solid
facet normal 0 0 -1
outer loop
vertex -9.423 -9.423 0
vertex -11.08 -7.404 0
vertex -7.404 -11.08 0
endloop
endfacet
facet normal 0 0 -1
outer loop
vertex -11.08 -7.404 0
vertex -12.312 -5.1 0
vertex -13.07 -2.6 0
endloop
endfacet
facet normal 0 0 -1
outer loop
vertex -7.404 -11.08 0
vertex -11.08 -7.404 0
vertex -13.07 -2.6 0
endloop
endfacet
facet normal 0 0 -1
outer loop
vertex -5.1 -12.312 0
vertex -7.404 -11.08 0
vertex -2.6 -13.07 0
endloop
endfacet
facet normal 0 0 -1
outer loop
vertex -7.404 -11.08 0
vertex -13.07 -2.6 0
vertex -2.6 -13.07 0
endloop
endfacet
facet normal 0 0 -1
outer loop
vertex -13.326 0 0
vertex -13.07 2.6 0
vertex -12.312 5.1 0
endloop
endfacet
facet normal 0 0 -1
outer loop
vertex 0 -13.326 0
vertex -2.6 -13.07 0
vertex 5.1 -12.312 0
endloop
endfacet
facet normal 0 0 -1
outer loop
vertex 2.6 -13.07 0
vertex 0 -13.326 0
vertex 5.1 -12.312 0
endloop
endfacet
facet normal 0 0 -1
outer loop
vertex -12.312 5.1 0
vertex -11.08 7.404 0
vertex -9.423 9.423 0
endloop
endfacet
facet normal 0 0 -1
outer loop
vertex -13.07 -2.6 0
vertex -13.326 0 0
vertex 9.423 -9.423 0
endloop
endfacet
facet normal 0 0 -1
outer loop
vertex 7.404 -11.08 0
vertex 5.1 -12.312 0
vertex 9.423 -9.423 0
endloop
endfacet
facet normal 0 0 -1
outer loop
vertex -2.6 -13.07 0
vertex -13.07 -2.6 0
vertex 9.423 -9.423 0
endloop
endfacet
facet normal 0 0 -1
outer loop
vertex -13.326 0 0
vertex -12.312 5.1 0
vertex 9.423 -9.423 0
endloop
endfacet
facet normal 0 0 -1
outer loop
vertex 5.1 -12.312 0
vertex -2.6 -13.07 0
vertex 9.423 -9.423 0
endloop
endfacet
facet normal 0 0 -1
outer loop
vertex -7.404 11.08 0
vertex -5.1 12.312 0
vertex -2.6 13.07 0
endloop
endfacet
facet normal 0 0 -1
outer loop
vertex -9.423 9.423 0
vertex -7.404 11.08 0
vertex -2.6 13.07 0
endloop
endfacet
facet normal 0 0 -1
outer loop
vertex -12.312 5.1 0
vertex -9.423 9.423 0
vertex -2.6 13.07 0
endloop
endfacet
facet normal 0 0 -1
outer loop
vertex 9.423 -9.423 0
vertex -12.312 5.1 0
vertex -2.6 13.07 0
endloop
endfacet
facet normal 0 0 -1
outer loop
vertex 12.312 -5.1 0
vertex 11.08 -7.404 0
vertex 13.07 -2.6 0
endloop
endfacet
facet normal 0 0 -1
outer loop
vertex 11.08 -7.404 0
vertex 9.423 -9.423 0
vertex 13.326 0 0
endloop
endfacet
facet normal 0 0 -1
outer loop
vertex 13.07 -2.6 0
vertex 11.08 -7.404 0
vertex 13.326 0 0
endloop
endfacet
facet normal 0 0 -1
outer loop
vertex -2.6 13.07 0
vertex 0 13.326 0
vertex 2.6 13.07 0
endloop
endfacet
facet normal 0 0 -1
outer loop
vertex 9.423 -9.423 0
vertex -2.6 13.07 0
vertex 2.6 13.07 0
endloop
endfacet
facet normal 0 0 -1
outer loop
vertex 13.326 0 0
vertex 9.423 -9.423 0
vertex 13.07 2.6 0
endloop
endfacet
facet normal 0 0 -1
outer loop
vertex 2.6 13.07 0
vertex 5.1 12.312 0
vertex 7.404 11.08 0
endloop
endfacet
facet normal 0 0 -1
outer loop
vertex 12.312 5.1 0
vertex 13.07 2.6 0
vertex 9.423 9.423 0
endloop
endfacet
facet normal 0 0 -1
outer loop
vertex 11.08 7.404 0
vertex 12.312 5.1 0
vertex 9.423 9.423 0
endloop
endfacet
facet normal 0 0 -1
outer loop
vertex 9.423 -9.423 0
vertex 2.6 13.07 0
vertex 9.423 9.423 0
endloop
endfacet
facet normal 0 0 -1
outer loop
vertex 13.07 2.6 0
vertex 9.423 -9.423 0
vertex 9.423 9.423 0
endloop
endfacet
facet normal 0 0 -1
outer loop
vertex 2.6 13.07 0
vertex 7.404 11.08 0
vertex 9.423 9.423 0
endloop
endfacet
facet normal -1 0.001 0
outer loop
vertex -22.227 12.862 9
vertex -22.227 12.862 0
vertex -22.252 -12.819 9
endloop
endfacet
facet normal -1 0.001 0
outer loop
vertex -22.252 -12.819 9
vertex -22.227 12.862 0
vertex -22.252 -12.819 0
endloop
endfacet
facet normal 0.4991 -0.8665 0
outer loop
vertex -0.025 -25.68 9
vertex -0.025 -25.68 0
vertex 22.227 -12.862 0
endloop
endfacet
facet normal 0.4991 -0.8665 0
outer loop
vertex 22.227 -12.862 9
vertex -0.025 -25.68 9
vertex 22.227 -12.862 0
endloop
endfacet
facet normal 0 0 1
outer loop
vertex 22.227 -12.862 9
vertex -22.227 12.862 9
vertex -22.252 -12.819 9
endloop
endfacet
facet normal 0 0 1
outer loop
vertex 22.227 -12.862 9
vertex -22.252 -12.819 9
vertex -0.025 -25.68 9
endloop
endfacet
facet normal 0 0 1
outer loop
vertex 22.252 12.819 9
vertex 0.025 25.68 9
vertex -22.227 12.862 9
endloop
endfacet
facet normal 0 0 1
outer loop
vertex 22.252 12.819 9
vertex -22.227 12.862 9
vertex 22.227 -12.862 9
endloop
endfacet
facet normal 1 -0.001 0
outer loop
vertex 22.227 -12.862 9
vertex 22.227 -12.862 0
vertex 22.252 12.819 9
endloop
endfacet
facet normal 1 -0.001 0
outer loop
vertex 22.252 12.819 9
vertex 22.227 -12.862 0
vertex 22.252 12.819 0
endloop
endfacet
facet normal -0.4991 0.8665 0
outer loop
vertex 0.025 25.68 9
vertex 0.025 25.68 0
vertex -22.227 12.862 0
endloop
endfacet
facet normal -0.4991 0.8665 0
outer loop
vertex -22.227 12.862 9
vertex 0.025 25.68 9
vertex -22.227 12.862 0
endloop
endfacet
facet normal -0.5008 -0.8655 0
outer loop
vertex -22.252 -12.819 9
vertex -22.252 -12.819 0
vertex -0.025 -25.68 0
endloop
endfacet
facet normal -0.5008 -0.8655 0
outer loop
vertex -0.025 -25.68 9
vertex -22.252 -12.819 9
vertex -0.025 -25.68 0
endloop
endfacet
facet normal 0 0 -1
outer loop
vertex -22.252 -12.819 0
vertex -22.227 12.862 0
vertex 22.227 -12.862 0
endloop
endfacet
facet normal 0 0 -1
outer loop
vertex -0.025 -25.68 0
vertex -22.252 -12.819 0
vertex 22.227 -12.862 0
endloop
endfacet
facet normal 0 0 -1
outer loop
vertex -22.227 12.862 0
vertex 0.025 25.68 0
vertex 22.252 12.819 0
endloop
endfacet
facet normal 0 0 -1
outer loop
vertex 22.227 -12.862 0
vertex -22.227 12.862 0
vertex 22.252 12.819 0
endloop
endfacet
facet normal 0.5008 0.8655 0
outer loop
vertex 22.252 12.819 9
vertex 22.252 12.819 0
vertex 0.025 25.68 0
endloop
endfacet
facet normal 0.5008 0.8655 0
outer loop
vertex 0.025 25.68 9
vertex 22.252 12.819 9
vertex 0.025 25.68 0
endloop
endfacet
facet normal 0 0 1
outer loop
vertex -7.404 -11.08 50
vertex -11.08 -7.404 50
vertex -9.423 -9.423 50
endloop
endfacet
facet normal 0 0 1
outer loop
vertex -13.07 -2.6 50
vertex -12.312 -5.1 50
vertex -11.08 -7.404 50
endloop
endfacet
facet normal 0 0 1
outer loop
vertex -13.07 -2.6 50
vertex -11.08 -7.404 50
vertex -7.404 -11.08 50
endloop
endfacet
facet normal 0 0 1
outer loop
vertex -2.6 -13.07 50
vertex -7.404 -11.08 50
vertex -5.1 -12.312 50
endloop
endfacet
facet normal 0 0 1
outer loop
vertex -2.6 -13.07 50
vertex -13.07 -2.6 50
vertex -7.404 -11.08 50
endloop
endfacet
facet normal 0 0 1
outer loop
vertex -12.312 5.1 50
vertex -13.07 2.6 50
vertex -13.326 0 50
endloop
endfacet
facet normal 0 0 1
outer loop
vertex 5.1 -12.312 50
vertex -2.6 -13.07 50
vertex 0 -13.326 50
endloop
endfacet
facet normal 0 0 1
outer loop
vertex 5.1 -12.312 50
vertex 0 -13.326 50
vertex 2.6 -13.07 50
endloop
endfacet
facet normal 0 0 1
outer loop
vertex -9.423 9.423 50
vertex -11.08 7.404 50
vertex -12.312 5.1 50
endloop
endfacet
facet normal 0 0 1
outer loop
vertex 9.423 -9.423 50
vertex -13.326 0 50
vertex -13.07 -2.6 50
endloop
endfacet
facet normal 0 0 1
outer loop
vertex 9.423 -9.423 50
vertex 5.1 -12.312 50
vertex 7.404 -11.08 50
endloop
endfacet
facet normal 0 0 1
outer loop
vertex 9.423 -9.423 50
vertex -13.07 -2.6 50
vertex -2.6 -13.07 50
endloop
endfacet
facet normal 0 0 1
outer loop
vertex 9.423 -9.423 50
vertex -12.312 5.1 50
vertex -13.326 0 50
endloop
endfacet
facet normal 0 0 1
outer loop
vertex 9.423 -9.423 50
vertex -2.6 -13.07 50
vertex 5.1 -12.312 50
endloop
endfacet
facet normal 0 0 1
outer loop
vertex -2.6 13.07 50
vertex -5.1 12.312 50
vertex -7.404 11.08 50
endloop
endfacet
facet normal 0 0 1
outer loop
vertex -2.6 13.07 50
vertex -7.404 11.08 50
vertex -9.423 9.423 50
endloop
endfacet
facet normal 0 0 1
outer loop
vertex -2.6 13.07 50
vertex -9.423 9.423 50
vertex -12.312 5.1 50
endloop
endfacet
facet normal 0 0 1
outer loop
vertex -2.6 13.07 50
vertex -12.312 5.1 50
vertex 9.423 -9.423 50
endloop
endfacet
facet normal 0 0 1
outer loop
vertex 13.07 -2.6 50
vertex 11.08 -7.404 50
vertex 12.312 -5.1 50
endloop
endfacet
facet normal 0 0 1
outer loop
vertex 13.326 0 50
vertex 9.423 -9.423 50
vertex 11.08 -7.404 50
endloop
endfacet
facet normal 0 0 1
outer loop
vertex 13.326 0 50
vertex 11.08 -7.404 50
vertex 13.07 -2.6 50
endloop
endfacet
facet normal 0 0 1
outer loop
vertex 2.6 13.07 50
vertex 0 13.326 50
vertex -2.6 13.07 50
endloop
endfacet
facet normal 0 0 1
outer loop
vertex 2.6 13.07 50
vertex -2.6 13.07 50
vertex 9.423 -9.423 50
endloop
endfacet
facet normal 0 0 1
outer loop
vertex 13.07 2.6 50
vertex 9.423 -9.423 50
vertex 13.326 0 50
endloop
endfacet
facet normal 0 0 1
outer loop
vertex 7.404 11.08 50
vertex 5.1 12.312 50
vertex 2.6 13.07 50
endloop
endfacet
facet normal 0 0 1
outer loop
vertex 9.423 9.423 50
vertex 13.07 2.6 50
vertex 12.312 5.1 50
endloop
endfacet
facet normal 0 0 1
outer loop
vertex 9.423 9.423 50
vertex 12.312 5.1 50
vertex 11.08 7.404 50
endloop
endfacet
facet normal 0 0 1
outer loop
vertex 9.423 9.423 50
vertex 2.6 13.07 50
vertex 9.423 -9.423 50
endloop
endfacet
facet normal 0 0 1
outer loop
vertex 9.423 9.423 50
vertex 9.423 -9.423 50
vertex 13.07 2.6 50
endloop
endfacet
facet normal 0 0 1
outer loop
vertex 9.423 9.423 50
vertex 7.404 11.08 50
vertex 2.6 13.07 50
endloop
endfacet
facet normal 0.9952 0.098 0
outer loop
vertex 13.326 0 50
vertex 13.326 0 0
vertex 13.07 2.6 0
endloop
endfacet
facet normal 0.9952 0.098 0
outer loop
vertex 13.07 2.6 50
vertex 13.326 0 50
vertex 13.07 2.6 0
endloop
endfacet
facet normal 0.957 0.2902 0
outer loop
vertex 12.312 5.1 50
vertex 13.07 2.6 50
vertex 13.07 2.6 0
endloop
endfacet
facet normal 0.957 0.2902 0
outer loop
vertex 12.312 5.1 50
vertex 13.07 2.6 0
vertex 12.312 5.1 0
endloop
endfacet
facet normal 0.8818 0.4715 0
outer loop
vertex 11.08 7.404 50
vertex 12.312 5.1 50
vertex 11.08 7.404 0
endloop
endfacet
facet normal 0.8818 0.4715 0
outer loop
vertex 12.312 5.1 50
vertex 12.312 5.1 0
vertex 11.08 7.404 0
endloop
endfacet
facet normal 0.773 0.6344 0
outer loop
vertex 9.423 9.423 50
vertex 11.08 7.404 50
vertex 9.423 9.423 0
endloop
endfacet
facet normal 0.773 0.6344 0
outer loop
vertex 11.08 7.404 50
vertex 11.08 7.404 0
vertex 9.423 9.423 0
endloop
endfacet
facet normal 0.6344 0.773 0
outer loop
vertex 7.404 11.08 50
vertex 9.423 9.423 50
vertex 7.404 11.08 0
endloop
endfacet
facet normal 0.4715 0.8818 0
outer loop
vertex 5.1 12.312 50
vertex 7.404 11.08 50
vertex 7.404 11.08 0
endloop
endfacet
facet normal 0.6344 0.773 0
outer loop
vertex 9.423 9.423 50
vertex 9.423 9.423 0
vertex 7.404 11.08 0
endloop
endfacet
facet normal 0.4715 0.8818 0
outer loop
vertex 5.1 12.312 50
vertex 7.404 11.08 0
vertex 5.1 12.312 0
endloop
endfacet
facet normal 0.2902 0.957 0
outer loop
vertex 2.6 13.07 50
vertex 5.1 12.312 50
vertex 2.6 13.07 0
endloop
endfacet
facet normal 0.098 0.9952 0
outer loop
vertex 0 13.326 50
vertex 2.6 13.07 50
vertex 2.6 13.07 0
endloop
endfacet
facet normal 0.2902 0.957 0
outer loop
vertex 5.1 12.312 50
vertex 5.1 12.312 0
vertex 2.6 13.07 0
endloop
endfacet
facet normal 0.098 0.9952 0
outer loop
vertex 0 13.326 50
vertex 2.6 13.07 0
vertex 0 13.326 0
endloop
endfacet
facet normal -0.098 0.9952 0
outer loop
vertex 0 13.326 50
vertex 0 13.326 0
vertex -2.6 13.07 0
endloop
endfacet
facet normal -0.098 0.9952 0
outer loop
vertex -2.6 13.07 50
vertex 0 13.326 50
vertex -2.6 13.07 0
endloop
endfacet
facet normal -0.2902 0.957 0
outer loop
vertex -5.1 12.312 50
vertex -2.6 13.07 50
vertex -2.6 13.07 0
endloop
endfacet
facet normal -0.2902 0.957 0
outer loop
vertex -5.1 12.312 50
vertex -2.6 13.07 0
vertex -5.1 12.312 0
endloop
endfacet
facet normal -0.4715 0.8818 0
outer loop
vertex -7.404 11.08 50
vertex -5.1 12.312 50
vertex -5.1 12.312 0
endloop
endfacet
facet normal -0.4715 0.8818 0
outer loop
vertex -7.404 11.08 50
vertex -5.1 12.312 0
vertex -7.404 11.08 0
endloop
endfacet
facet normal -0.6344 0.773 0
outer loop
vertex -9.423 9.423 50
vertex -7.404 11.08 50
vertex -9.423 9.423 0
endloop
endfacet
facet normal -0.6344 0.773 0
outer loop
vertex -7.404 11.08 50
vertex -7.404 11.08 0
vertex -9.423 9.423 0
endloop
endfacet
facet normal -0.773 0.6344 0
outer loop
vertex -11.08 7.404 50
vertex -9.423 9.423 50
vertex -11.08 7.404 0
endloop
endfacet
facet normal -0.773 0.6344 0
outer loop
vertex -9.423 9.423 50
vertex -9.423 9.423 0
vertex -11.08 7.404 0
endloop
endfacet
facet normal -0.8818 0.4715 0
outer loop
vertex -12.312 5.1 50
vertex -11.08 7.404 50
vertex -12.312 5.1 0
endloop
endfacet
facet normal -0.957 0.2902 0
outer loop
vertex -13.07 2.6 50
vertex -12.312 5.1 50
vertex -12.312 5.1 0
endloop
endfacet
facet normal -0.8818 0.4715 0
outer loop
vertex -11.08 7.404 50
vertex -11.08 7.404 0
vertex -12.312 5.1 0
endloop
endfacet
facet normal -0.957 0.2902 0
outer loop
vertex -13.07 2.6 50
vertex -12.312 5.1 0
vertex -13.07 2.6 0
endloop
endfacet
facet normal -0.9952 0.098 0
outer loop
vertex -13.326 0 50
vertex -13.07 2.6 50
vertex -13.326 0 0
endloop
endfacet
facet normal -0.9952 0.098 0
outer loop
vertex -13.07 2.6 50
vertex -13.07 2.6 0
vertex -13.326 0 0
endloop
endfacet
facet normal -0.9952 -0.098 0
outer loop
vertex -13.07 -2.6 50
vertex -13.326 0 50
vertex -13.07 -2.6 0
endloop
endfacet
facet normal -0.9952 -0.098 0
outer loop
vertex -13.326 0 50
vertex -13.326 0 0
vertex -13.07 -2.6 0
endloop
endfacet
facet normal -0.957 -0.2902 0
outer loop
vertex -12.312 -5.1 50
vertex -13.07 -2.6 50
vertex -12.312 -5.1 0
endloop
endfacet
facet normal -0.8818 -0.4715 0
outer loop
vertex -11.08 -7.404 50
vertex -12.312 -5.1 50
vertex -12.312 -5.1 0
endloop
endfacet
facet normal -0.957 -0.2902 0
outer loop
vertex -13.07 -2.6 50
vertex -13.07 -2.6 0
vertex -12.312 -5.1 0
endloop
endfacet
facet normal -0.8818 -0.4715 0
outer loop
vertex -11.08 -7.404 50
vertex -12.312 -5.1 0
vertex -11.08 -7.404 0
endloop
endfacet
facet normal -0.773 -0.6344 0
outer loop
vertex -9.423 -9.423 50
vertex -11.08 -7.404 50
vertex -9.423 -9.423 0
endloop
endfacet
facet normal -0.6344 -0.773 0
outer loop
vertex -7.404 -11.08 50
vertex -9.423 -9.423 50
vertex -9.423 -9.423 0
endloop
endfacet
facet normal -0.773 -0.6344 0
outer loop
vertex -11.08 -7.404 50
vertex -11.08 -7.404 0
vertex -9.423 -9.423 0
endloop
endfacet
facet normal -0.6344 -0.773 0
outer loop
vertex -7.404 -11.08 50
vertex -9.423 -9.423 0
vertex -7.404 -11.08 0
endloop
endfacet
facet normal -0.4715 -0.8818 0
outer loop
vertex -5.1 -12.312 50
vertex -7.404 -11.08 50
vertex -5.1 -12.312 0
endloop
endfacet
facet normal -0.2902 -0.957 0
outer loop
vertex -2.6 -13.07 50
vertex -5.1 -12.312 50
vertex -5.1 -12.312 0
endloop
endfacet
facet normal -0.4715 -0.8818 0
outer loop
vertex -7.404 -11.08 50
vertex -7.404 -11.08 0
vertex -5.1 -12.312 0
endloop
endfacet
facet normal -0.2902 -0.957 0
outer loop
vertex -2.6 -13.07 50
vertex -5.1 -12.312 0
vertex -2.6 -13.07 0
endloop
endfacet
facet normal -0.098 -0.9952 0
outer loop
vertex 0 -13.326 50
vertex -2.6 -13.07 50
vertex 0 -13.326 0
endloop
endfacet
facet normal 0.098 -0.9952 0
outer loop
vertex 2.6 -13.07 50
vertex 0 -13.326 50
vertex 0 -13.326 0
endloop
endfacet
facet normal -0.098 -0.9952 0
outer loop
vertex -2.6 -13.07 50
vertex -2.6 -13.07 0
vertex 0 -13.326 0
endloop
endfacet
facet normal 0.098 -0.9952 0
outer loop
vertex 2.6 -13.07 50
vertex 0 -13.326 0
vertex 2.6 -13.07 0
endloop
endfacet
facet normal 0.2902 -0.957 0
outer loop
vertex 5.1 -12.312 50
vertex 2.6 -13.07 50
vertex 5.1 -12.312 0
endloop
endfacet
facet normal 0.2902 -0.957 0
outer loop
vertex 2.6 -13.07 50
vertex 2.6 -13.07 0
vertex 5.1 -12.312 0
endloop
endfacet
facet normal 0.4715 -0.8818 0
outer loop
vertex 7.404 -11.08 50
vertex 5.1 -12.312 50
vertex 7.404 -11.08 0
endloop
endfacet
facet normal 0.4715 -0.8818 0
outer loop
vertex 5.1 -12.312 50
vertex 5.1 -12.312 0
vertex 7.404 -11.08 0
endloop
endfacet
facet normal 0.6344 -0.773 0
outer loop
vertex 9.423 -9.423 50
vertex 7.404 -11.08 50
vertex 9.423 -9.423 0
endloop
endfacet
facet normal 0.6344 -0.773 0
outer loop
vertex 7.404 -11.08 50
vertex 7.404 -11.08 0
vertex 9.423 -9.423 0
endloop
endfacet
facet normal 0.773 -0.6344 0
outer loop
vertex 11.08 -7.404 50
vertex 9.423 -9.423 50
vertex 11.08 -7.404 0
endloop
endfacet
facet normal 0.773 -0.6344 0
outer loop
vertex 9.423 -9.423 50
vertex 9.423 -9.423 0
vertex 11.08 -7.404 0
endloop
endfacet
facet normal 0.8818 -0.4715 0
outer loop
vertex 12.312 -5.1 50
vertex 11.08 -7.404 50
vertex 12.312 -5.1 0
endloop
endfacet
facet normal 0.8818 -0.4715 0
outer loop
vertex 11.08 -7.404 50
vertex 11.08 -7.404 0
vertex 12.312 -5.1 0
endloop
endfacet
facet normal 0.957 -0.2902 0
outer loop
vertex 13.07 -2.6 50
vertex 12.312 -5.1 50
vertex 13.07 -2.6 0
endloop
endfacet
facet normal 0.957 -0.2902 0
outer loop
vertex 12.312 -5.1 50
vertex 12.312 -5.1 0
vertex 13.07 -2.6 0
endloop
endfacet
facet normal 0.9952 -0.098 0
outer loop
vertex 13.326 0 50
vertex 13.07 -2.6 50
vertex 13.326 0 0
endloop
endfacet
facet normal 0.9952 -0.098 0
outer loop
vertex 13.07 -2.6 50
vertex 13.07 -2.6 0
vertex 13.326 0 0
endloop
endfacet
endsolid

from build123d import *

# Parameters (mm, degrees)
F1_DEPTH = 9
F2_R     = 13.3263781117
F3_DEPTH = 50


with BuildPart() as f1:
    # F0 (on Top) → F1 (new body)
    with BuildSketch(Plane.XY):
        Polygon((22.2521245334, 12.818630667), (0.0248024674, 25.6802204676), (-22.227322066, 12.8615898006), (-22.2521245334, -12.818630667), (-0.0248024674, -25.6802204676), (22.227322066, -12.8615898006), align=None)
    extrude(amount=F1_DEPTH)


with BuildPart() as f3:
    # F2 (on Top) → F3 (new body)
    with BuildSketch(Plane.XY):
        Circle(F2_R)
    extrude(amount=F3_DEPTH)


solid = Compound([f1.part, f3.part])
